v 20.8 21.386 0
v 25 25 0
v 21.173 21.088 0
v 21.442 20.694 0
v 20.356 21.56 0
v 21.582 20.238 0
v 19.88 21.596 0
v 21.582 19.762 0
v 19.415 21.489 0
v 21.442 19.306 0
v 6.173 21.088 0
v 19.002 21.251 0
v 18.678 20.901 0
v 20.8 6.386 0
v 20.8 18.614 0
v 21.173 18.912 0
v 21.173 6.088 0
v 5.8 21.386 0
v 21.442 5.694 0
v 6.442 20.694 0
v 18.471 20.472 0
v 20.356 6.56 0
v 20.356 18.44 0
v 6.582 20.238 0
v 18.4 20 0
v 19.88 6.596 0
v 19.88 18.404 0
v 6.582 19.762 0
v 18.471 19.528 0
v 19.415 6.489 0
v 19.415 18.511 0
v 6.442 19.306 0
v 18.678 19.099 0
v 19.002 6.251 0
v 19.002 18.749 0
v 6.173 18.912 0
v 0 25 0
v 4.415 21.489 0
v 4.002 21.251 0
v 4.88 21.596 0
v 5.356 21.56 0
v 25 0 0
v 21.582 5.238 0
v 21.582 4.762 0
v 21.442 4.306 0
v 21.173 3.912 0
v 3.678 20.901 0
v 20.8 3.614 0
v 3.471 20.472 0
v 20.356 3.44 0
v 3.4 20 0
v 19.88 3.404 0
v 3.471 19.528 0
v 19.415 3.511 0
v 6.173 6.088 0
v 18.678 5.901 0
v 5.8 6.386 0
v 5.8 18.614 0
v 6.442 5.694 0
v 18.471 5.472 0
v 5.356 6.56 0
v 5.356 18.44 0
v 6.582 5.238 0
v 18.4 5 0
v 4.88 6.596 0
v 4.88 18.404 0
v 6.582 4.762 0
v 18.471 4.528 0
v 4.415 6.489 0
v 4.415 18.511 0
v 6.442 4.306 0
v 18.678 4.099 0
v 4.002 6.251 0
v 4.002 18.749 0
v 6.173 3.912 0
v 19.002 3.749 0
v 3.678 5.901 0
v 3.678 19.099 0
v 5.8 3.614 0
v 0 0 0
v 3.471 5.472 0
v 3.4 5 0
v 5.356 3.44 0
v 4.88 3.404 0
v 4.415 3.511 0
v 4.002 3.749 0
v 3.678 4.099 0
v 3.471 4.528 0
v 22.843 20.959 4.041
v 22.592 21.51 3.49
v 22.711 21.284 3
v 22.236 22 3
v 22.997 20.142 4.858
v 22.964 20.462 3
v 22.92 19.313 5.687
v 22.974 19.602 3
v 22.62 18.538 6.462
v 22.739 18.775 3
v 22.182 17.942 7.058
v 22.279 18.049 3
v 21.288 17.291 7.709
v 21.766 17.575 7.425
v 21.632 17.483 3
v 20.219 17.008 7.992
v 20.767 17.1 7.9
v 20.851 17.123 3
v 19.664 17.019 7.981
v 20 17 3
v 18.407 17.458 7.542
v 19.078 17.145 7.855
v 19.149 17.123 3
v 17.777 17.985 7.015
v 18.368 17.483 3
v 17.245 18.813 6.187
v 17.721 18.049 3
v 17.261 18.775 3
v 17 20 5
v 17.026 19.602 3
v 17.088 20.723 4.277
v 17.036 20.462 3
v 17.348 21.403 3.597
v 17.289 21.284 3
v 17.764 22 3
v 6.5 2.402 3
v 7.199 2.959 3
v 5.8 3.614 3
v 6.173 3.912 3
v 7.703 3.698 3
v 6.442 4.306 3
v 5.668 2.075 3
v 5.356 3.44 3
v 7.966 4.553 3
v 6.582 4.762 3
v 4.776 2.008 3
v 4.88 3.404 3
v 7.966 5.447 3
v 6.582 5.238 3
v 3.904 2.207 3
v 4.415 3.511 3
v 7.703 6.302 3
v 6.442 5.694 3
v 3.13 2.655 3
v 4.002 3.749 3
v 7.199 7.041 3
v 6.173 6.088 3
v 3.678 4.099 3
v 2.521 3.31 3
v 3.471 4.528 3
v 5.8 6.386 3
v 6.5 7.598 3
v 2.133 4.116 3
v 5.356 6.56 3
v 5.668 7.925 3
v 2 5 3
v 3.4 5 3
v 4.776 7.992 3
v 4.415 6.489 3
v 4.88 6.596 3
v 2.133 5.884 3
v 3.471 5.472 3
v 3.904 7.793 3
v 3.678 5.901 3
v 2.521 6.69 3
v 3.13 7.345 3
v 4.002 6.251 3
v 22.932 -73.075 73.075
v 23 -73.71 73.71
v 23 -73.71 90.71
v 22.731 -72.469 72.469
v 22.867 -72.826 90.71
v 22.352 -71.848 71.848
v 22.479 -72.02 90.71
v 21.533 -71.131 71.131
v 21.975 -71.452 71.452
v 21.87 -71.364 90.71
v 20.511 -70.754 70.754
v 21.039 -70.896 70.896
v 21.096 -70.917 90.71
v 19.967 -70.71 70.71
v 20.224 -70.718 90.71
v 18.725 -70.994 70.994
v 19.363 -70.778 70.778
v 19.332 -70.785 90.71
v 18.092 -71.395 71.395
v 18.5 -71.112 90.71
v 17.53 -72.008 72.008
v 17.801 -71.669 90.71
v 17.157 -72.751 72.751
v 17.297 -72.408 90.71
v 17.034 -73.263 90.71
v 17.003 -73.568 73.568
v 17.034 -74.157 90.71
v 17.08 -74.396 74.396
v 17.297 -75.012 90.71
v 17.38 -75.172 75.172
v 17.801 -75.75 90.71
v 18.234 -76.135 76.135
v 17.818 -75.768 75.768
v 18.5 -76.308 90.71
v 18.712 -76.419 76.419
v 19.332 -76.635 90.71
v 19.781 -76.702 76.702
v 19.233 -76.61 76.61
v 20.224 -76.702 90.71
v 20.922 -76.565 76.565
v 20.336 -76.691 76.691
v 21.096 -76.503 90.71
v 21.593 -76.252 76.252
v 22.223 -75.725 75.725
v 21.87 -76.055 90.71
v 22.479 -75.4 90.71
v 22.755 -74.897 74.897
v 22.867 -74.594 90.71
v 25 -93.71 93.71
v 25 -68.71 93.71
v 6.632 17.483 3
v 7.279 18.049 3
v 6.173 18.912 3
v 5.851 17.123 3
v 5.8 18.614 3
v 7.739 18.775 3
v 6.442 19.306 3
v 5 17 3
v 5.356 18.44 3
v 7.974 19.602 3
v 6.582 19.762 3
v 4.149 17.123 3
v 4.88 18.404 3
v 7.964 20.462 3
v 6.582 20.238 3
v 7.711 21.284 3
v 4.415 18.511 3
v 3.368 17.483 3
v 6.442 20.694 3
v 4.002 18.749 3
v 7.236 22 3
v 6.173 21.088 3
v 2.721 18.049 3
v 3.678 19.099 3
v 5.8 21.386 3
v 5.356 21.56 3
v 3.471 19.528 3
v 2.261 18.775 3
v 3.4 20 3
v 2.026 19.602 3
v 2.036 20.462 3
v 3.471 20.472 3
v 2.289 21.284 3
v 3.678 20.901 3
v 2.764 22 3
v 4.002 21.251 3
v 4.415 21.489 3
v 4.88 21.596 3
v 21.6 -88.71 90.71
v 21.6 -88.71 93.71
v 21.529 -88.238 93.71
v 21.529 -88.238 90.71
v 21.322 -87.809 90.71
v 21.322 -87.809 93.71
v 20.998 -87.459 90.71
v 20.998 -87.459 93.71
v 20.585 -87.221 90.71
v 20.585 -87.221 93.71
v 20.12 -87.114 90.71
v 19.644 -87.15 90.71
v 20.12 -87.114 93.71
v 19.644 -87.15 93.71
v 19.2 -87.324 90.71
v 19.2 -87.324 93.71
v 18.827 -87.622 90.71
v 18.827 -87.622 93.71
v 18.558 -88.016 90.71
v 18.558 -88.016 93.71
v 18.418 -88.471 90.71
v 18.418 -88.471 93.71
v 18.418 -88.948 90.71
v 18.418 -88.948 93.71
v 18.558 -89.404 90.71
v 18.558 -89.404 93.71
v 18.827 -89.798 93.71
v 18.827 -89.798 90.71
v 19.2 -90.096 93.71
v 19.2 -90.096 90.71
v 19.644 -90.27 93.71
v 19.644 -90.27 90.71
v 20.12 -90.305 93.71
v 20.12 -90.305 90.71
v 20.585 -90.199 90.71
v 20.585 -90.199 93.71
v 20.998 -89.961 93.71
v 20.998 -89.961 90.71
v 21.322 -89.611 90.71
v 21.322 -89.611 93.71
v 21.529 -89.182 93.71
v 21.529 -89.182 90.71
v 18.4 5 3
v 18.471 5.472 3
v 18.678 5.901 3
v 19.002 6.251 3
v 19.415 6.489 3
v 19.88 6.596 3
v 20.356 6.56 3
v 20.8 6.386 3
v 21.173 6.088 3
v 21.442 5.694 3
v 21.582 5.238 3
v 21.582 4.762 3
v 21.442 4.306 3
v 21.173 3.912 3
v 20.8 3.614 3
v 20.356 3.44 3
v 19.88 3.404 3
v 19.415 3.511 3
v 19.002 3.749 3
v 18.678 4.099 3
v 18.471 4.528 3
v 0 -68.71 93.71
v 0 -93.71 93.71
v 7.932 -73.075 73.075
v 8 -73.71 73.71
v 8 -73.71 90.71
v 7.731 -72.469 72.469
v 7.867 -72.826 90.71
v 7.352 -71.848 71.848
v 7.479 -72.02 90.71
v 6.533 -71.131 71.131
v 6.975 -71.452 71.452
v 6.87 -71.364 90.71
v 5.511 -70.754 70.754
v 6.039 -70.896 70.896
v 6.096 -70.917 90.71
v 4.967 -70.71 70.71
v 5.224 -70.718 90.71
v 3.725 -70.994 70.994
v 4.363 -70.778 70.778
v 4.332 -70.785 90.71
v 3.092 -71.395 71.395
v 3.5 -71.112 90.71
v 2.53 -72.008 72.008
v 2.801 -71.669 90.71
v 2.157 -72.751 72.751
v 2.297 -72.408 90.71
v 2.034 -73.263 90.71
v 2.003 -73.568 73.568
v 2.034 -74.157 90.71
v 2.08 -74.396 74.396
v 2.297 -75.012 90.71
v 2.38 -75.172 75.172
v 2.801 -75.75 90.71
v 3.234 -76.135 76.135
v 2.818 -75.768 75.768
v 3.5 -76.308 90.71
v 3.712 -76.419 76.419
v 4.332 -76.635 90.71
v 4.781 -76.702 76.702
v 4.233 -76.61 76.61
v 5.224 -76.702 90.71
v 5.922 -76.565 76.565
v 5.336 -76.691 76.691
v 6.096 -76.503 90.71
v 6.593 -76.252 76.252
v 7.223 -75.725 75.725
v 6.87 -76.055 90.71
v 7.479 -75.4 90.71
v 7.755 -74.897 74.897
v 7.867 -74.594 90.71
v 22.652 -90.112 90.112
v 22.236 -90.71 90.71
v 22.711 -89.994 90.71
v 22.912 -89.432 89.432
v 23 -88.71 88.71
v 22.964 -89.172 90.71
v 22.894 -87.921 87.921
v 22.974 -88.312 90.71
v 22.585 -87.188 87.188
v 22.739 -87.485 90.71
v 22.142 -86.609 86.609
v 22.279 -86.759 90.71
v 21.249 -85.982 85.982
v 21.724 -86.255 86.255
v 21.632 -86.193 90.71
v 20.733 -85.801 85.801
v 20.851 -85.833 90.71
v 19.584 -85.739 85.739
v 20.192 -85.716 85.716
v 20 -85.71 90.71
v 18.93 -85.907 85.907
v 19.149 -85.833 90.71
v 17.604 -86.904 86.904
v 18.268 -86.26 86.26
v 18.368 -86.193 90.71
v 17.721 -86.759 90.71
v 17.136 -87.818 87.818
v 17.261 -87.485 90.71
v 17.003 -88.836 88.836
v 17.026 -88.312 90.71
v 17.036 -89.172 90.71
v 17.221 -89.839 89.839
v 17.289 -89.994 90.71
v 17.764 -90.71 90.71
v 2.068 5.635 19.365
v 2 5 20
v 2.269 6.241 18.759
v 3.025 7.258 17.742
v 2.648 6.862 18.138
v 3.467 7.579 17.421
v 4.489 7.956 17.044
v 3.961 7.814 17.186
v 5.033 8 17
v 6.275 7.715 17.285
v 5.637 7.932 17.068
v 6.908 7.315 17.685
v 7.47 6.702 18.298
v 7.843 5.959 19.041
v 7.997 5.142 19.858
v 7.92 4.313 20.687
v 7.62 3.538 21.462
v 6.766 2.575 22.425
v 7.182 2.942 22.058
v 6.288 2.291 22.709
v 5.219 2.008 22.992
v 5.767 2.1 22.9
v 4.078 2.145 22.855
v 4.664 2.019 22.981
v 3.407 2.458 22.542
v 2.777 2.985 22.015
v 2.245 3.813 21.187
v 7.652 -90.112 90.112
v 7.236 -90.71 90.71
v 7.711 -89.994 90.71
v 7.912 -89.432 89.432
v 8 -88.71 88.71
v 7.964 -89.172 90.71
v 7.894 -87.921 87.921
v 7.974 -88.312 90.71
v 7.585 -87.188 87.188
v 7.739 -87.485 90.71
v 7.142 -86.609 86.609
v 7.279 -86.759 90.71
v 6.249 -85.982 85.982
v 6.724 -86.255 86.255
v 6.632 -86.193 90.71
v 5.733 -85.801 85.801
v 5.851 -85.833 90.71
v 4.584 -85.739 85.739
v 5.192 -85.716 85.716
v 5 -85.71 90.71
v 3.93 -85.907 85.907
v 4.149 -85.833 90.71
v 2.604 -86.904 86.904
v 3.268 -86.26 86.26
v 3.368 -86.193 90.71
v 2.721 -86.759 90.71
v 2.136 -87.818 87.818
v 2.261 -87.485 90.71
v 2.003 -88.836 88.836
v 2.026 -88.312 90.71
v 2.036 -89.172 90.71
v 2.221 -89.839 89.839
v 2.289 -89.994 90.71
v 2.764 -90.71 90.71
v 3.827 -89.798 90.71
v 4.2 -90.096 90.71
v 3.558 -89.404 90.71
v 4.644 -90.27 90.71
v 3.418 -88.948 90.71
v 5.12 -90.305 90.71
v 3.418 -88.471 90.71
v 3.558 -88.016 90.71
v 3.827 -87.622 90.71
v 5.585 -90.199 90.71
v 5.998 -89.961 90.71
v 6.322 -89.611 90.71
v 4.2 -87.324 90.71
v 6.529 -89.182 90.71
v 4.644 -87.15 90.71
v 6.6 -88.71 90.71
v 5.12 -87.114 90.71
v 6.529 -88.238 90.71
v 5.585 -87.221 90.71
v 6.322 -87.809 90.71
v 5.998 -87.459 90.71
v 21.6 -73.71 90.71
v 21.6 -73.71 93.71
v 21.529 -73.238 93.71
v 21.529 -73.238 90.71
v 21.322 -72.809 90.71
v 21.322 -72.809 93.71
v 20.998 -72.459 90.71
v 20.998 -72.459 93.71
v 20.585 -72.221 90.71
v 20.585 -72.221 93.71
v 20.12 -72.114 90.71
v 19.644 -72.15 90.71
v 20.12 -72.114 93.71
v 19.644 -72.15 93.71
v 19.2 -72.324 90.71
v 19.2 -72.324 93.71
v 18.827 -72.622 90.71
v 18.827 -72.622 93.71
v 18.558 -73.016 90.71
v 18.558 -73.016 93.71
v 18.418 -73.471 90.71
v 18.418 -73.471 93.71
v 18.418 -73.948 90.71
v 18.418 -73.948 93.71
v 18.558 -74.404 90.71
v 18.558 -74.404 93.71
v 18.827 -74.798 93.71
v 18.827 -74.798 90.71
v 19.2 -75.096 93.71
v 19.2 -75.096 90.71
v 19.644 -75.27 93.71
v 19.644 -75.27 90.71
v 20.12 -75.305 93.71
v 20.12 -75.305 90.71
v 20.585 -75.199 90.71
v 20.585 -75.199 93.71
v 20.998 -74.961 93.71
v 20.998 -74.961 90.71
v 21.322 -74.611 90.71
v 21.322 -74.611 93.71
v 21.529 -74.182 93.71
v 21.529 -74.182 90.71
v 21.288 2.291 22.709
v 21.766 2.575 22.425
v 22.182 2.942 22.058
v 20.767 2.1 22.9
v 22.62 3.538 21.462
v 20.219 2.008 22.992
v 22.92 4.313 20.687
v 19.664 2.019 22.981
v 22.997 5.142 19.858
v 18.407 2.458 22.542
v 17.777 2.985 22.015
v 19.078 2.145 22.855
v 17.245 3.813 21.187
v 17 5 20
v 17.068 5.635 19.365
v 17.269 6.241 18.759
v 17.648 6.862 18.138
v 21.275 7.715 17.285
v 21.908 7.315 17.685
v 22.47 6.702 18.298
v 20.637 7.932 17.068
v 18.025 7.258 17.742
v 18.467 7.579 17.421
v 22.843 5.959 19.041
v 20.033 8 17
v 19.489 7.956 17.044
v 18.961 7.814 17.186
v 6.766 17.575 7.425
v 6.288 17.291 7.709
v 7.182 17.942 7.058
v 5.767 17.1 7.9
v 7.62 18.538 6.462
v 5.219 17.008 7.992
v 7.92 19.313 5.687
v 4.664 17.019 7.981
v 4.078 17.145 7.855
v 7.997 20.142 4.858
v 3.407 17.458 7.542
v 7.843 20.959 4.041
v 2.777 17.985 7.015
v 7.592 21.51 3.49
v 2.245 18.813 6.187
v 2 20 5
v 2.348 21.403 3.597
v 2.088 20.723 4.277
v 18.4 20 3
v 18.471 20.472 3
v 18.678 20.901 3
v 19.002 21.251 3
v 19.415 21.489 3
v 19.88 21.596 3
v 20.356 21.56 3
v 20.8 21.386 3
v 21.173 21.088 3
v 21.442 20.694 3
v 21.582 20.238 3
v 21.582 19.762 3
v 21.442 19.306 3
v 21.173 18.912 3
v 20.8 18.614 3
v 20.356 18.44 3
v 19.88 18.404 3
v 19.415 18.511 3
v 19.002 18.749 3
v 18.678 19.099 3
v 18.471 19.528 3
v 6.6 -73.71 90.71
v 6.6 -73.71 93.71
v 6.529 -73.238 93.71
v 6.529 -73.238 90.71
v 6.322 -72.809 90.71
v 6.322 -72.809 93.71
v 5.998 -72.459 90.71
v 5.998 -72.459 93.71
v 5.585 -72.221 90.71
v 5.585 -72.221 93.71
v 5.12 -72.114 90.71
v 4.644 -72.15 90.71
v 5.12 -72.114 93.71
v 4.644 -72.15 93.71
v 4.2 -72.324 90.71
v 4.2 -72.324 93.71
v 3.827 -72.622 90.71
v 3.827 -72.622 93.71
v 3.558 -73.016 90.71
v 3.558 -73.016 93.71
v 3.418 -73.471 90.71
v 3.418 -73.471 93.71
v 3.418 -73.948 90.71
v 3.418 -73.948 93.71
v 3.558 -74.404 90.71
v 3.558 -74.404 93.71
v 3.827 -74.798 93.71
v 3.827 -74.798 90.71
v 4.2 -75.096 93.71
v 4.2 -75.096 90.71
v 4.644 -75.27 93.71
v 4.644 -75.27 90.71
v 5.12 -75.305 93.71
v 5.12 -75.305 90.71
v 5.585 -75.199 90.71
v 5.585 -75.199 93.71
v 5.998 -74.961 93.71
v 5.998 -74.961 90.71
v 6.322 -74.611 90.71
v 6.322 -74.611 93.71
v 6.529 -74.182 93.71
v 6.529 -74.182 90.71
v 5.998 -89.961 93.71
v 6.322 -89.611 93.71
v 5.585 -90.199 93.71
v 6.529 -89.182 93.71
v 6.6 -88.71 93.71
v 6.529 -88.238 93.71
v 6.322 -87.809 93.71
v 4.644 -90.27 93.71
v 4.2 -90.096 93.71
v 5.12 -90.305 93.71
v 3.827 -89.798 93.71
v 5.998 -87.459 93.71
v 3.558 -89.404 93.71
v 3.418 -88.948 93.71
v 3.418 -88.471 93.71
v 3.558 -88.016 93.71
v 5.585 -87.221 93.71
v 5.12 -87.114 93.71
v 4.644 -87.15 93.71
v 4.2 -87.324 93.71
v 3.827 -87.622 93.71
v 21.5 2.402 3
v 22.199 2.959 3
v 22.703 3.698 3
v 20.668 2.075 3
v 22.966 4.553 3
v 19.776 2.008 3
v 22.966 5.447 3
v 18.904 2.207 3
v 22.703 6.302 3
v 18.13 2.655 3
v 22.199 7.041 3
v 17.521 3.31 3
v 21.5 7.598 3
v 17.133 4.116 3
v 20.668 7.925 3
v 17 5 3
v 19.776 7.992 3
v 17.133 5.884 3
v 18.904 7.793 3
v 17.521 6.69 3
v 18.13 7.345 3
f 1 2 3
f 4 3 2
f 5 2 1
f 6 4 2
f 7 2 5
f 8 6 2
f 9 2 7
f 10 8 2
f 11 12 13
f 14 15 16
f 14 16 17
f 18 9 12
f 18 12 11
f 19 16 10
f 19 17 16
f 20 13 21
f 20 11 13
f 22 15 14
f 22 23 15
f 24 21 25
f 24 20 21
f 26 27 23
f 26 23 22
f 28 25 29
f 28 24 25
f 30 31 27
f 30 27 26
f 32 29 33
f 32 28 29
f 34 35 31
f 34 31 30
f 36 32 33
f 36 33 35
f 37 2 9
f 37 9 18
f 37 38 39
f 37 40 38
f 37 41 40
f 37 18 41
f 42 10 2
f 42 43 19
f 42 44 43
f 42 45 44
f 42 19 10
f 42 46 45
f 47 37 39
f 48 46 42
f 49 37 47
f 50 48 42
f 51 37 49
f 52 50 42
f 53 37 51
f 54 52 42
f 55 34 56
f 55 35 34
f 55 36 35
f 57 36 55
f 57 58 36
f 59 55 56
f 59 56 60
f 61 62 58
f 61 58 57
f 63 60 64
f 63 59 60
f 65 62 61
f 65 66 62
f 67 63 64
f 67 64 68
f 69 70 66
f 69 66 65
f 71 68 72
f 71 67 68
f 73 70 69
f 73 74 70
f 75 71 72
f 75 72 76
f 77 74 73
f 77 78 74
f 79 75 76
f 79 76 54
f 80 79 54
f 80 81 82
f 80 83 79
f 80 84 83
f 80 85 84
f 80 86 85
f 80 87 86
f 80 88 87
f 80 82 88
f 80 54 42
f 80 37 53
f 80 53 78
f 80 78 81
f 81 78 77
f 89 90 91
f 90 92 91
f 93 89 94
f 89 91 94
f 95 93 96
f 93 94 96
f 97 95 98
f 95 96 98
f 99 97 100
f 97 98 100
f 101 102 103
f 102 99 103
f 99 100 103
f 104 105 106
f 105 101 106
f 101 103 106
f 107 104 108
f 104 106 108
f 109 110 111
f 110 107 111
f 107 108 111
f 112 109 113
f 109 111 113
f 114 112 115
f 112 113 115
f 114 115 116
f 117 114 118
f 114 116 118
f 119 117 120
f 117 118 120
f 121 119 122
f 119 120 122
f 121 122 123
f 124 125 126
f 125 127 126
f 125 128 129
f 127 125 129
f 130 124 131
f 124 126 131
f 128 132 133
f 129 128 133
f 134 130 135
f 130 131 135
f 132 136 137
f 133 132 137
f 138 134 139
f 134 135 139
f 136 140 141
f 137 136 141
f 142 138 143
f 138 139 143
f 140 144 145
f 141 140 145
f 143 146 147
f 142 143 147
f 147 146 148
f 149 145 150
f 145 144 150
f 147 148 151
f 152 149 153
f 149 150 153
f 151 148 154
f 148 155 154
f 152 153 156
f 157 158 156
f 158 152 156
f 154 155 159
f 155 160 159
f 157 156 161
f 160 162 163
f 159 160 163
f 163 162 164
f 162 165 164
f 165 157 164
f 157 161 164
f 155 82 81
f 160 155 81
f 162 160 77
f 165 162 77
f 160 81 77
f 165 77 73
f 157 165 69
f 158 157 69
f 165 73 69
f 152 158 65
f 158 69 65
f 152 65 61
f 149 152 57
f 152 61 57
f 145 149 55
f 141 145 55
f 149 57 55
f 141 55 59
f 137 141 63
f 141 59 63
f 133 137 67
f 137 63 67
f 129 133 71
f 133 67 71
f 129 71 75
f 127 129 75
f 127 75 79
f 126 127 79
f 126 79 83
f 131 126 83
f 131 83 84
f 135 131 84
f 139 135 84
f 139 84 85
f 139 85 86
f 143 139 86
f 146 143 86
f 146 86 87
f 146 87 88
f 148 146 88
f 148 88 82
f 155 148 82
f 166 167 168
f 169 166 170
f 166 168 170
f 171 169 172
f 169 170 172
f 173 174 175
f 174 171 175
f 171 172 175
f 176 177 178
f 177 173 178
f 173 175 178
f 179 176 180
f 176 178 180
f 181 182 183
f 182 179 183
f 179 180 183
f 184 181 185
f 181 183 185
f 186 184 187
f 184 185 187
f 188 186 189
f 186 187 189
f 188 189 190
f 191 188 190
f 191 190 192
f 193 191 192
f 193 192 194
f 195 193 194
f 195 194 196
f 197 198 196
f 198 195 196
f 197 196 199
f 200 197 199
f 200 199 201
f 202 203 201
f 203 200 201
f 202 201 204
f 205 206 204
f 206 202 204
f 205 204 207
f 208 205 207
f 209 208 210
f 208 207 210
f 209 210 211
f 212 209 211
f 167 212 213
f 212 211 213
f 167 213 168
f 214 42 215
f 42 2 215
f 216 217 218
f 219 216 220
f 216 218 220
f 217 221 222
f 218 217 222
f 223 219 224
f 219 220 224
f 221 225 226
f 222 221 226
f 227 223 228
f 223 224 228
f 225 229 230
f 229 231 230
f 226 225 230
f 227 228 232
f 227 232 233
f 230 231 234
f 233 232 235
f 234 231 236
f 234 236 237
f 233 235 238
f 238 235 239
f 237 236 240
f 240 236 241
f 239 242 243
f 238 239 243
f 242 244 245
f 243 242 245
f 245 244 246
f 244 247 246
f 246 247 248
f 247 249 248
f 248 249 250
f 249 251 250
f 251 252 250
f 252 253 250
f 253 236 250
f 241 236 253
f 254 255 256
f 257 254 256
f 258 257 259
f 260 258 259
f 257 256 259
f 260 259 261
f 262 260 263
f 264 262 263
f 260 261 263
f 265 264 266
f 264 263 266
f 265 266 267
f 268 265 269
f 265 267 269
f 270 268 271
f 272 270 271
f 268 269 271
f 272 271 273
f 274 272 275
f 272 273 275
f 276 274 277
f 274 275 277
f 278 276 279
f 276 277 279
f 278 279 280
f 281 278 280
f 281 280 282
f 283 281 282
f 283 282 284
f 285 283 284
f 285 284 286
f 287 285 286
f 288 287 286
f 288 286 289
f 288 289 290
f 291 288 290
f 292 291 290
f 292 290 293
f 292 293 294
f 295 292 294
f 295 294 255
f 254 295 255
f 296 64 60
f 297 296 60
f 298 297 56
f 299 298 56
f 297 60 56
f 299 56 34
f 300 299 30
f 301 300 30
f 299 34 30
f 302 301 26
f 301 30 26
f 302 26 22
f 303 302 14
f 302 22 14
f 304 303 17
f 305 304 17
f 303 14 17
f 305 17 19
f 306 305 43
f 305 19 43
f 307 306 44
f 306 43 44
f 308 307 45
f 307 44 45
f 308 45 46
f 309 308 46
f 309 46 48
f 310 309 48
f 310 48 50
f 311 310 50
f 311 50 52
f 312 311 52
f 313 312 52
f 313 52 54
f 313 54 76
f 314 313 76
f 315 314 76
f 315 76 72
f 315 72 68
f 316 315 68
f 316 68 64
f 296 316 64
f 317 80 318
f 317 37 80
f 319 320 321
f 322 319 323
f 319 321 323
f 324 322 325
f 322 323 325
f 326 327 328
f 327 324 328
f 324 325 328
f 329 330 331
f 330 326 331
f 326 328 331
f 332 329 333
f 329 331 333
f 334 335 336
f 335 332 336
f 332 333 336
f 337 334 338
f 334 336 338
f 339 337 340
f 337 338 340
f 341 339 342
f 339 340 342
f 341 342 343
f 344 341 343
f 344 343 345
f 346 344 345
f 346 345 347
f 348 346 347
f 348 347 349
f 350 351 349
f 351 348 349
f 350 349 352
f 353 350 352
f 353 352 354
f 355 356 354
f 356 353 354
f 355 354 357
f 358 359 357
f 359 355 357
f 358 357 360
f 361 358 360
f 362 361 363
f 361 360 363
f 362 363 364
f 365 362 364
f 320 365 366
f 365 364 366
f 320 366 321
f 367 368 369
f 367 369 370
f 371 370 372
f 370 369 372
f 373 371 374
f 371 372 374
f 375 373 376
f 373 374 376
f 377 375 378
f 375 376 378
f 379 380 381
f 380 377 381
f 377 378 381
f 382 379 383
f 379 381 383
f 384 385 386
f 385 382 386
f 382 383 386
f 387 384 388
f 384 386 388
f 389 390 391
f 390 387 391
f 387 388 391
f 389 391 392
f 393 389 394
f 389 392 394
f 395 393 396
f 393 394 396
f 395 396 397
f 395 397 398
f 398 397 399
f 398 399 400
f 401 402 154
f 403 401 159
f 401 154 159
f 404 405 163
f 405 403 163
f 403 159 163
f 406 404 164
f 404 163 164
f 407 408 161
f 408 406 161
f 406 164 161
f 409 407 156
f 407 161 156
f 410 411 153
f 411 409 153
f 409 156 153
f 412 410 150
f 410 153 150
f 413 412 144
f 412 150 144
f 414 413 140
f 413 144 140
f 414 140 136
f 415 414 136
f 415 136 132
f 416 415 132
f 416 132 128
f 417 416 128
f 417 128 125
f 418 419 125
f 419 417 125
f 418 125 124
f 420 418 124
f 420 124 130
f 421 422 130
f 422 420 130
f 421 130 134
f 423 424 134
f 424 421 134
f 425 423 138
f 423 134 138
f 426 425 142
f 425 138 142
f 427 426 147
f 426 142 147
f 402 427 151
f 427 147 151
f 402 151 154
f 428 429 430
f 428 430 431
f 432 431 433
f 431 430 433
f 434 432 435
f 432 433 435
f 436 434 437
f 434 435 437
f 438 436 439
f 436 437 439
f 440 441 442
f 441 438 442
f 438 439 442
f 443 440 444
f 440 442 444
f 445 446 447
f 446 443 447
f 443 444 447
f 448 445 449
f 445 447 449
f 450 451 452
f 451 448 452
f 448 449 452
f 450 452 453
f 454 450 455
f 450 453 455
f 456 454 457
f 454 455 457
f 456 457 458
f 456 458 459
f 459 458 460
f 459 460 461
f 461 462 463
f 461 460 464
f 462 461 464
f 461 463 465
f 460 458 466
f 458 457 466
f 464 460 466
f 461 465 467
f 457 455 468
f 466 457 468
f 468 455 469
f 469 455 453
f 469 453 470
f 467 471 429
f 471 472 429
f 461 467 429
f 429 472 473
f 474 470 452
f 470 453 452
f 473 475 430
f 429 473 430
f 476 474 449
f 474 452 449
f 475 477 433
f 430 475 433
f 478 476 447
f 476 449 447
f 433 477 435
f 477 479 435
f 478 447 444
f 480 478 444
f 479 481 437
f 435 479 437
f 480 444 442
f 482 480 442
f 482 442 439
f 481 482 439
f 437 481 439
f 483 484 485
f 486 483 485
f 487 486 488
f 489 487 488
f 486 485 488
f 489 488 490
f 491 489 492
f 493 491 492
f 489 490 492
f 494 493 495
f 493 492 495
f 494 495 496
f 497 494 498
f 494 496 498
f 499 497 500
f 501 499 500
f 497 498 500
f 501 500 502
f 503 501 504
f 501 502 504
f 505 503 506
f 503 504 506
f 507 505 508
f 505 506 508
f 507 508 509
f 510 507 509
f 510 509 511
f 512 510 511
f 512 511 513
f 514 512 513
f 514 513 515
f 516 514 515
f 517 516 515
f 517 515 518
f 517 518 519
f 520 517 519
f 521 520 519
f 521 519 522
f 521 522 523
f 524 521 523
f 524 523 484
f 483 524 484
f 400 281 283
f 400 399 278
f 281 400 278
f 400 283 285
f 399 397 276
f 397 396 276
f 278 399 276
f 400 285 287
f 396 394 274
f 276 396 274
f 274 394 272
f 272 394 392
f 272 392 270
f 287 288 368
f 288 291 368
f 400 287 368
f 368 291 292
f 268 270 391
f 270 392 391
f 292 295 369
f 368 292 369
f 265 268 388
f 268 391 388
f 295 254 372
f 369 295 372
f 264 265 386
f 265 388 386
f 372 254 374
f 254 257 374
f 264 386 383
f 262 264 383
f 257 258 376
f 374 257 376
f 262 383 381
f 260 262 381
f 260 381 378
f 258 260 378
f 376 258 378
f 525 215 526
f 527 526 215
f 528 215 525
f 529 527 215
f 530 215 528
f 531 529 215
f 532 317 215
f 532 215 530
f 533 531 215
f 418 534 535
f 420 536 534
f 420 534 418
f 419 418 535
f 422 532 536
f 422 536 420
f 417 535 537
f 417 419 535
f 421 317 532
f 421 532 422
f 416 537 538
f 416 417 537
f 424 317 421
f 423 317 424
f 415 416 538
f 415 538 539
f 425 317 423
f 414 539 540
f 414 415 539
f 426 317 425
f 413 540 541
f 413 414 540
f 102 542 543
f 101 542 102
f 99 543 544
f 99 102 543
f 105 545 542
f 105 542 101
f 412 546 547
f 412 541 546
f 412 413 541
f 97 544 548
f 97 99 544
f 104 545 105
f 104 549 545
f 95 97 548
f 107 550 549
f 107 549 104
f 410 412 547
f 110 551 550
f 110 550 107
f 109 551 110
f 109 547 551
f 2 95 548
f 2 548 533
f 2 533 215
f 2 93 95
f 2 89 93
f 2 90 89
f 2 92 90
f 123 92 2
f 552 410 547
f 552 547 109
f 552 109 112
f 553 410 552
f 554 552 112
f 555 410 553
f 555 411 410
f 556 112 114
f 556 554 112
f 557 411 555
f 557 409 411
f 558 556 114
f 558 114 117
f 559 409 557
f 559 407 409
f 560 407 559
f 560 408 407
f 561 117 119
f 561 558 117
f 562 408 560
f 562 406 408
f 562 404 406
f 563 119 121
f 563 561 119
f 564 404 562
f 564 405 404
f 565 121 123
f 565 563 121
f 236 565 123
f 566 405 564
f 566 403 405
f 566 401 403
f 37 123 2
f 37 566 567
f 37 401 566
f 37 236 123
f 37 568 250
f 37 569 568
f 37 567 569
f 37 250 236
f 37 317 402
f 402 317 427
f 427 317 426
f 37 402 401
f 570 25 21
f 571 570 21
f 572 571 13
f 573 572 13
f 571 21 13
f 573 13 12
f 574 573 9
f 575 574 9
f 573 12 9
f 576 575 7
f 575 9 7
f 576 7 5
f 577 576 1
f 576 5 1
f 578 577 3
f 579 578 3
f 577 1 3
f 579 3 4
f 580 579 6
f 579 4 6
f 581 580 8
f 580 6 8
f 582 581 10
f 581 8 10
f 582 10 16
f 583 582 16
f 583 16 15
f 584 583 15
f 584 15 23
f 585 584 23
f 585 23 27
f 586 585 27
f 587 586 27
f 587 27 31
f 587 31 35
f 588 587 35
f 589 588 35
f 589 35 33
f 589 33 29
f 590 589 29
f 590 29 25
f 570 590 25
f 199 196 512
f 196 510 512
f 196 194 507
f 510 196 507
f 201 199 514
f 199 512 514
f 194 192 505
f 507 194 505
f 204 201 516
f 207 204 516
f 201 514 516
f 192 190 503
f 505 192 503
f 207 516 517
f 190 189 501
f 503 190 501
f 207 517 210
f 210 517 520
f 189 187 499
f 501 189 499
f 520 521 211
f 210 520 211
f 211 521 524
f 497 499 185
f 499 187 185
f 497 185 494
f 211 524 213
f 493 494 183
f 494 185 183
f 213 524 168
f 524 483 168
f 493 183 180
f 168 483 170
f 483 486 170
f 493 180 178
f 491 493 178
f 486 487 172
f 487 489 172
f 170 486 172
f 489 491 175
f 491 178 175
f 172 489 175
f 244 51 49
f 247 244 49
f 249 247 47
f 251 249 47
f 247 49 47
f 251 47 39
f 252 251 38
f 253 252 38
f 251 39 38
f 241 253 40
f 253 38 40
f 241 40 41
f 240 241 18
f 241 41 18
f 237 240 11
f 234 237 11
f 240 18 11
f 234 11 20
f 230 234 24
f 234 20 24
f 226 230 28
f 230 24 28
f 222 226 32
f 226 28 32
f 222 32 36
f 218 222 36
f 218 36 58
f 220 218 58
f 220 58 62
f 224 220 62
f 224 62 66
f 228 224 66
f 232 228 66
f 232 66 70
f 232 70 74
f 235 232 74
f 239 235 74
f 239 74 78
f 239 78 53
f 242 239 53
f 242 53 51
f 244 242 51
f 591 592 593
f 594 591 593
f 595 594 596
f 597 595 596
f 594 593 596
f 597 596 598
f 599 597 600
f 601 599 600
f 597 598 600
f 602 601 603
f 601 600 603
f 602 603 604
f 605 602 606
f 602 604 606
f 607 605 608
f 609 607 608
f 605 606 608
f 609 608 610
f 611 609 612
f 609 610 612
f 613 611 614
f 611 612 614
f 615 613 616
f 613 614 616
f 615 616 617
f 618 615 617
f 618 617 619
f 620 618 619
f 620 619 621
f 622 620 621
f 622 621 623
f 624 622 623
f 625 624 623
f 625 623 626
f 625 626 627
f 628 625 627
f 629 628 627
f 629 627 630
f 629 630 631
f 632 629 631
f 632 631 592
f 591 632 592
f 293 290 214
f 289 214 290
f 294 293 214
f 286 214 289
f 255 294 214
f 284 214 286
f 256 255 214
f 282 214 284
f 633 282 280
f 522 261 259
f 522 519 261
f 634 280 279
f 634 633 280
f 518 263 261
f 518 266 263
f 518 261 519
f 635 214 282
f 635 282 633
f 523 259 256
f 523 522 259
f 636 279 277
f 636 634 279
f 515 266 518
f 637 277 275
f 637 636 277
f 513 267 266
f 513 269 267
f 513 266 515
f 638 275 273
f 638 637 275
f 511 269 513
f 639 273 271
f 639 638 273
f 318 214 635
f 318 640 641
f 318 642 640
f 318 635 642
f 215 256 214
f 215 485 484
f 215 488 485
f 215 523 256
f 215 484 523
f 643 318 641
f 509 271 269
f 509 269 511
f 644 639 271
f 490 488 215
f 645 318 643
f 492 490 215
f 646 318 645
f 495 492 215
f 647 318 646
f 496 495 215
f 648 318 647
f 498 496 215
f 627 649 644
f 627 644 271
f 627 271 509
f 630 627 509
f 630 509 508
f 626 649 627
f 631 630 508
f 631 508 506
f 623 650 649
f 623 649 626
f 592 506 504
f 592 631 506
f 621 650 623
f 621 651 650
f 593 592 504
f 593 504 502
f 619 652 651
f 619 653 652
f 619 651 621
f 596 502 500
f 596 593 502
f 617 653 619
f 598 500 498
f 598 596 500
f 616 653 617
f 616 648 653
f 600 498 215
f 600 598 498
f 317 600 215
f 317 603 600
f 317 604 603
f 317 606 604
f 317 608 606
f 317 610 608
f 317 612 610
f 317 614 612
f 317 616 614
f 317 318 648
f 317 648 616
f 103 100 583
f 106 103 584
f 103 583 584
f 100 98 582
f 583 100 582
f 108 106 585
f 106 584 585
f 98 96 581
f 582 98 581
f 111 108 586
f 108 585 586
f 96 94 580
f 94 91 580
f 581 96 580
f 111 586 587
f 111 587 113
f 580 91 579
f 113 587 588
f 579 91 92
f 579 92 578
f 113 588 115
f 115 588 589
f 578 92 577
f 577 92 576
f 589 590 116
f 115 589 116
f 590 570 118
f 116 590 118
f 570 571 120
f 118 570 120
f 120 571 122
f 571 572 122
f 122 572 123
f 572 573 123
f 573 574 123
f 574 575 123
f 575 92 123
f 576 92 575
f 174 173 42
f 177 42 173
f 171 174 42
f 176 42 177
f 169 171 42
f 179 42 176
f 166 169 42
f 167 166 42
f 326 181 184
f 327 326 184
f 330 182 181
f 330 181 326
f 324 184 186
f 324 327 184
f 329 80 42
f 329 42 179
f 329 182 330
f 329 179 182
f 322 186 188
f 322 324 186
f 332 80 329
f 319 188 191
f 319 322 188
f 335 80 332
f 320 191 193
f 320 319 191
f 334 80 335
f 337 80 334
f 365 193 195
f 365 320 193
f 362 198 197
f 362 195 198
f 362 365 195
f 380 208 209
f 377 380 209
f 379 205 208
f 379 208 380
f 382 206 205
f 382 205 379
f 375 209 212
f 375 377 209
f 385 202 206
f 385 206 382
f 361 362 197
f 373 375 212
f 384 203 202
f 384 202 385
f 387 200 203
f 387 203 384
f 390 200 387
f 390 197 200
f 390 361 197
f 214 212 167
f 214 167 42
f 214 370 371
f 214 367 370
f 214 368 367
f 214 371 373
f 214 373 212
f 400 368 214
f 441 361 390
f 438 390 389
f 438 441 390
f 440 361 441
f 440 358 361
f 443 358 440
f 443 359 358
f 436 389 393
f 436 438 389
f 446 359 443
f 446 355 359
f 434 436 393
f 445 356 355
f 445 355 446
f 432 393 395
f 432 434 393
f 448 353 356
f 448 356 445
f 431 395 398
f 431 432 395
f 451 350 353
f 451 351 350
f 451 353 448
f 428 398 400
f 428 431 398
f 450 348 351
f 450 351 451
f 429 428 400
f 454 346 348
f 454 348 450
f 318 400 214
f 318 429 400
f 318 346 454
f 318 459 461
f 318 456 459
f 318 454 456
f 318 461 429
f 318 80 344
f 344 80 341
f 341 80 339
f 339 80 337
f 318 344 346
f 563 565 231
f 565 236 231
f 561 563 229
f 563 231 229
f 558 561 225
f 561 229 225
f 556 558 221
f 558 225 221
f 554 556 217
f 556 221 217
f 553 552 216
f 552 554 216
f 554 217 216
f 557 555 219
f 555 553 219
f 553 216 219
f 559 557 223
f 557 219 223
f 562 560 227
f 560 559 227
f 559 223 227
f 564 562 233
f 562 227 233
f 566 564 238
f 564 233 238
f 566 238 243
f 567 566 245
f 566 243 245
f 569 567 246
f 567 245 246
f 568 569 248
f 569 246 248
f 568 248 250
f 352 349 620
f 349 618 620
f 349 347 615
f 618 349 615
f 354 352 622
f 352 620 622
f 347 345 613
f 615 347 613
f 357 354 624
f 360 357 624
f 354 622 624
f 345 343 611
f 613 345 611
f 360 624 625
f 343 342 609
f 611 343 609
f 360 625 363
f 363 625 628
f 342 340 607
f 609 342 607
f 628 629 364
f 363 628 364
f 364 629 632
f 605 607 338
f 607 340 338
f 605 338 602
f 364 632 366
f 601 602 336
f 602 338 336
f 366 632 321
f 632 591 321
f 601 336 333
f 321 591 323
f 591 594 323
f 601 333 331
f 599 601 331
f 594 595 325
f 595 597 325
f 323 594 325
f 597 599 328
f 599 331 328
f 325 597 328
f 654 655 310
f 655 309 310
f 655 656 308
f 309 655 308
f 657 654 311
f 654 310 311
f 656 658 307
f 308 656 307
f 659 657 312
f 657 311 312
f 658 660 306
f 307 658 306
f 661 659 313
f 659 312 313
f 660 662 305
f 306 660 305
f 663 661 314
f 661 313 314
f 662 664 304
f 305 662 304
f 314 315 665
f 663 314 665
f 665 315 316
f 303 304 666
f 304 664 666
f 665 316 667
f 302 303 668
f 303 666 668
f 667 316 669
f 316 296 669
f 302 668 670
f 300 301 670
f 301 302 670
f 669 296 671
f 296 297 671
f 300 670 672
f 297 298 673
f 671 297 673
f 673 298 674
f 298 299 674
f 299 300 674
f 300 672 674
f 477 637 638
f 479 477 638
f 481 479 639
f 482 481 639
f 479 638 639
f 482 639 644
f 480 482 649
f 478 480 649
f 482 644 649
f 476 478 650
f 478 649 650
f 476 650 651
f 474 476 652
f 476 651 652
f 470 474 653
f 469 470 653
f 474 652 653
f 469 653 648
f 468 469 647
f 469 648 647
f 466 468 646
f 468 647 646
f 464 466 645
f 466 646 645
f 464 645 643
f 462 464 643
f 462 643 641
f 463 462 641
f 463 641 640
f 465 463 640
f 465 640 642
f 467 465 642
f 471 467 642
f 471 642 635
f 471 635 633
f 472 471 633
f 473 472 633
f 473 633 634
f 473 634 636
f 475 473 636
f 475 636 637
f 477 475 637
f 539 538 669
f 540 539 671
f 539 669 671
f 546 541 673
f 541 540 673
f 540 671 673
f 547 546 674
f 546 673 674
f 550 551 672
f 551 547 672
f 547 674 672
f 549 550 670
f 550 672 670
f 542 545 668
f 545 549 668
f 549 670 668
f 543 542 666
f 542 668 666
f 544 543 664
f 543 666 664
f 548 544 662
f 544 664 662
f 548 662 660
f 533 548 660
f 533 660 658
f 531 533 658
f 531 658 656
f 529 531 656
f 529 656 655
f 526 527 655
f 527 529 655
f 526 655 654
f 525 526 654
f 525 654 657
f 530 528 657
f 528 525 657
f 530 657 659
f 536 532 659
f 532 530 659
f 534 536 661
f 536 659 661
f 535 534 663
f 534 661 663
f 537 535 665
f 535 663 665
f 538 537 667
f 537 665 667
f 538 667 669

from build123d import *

# Parameters (mm, degrees)
BOSS_EXTRUDE1_DEPTH = 25
CUT_EXTRUDE7_REACH  = 139.863
CUT_EXTRUDE7_START  = -3
SKETCH3_R           = 3
SKETCH3_R_2         = 1.6
CUT_EXTRUDE8_REACH  = 136.863
SKETCH3_3_R         = 1.6
CUT_EXTRUDE9_REACH  = 139.863
CUT_EXTRUDE9_START  = -3
SKETCH4_R           = 3
SKETCH4_R_2         = 1.6
CUT_EXTRUDE10_REACH = 136.863
SKETCH4_2_R         = 1.6


with BuildPart() as part:
    # Sketch1 → Boss-Extrude1 (new body)
    with BuildSketch(Plane(origin=(0, 0, 0), x_dir=(0, 0, -1), z_dir=(1, 0, 0))):
        Polygon((0, 0), (-93.70992099, -93.70992099), (-93.70992099, -68.70992099), (0, 25), align=None)
    extrude(amount=BOSS_EXTRUDE1_DEPTH)

    # Sketch3 → Cut-Extrude7 (cut, up to next)
    with BuildSketch(Plane(origin=(0, 0, 0), x_dir=(-1, 0, 0), z_dir=(0, 0, -1)).offset(CUT_EXTRUDE7_START), mode=Mode.PRIVATE) as cut_extrude7_sk1:
        with Locations((-20, 20)):
            Circle(SKETCH3_R)
        with Locations((-20, 20)):
            Circle(SKETCH3_R_2, mode=Mode.SUBTRACT)
    cut_extrude7_tool1 = extrude(cut_extrude7_sk1.sketch, amount=-CUT_EXTRUDE7_REACH, mode=Mode.PRIVATE) & part.part
    # Sketch3 → Cut-Extrude7 (cut, up to next)
    with BuildSketch(Plane(origin=(0, 0, 0), x_dir=(-1, 0, 0), z_dir=(0, 0, -1)).offset(CUT_EXTRUDE7_START), mode=Mode.PRIVATE) as cut_extrude7_sk2:
        with Locations((-20, 5)):
            Circle(SKETCH3_R)
        with Locations((-20, 5)):
            Circle(SKETCH3_R_2, mode=Mode.SUBTRACT)
    cut_extrude7_tool2 = extrude(cut_extrude7_sk2.sketch, amount=-CUT_EXTRUDE7_REACH, mode=Mode.PRIVATE) & part.part
    # Sketch3 → Cut-Extrude7 (cut, up to next)
    with BuildSketch(Plane(origin=(0, 0, 0), x_dir=(-1, 0, 0), z_dir=(0, 0, -1)).offset(CUT_EXTRUDE7_START), mode=Mode.PRIVATE) as cut_extrude7_sk3:
        with Locations((-5, 5)):
            Circle(SKETCH3_R)
        with Locations((-5, 5)):
            Circle(SKETCH3_R_2, mode=Mode.SUBTRACT)
    cut_extrude7_tool3 = extrude(cut_extrude7_sk3.sketch, amount=-CUT_EXTRUDE7_REACH, mode=Mode.PRIVATE) & part.part
    # Sketch3 → Cut-Extrude7 (cut, up to next)
    with BuildSketch(Plane(origin=(0, 0, 0), x_dir=(-1, 0, 0), z_dir=(0, 0, -1)).offset(CUT_EXTRUDE7_START), mode=Mode.PRIVATE) as cut_extrude7_sk4:
        with Locations((-5, 20)):
            Circle(SKETCH3_R)
        with Locations((-5, 20)):
            Circle(SKETCH3_R_2, mode=Mode.SUBTRACT)
    cut_extrude7_tool4 = extrude(cut_extrude7_sk4.sketch, amount=-CUT_EXTRUDE7_REACH, mode=Mode.PRIVATE) & part.part
    add(cut_extrude7_tool1.solids().sort_by_distance((22.915147, 20, 3))[0], mode=Mode.SUBTRACT)
    add(cut_extrude7_tool2.solids().sort_by_distance((22.915147, 5, 3))[0], mode=Mode.SUBTRACT)
    add(cut_extrude7_tool3.solids().sort_by_distance((7.915147, 5, 3))[0], mode=Mode.SUBTRACT)
    add(cut_extrude7_tool4.solids().sort_by_distance((7.915147, 20, 3))[0], mode=Mode.SUBTRACT)

    # Sketch3<3> → Cut-Extrude8 (cut, up to next)
    with BuildSketch(Plane(origin=(0, 0, 0), x_dir=(-1, 0, 0), z_dir=(0, 0, -1)), mode=Mode.PRIVATE) as cut_extrude8_sk1:
        with Locations((-20, 20)):
            Circle(SKETCH3_3_R)
    cut_extrude8_tool1 = extrude(cut_extrude8_sk1.sketch, amount=-CUT_EXTRUDE8_REACH, mode=Mode.PRIVATE) & part.part
    # Sketch3<3> → Cut-Extrude8 (cut, up to next)
    with BuildSketch(Plane(origin=(0, 0, 0), x_dir=(-1, 0, 0), z_dir=(0, 0, -1)), mode=Mode.PRIVATE) as cut_extrude8_sk2:
        with Locations((-20, 5)):
            Circle(SKETCH3_3_R)
    cut_extrude8_tool2 = extrude(cut_extrude8_sk2.sketch, amount=-CUT_EXTRUDE8_REACH, mode=Mode.PRIVATE) & part.part
    # Sketch3<3> → Cut-Extrude8 (cut, up to next)
    with BuildSketch(Plane(origin=(0, 0, 0), x_dir=(-1, 0, 0), z_dir=(0, 0, -1)), mode=Mode.PRIVATE) as cut_extrude8_sk3:
        with Locations((-5, 5)):
            Circle(SKETCH3_3_R)
    cut_extrude8_tool3 = extrude(cut_extrude8_sk3.sketch, amount=-CUT_EXTRUDE8_REACH, mode=Mode.PRIVATE) & part.part
    # Sketch3<3> → Cut-Extrude8 (cut, up to next)
    with BuildSketch(Plane(origin=(0, 0, 0), x_dir=(-1, 0, 0), z_dir=(0, 0, -1)), mode=Mode.PRIVATE) as cut_extrude8_sk4:
        with Locations((-5, 20)):
            Circle(SKETCH3_3_R)
    cut_extrude8_tool4 = extrude(cut_extrude8_sk4.sketch, amount=-CUT_EXTRUDE8_REACH, mode=Mode.PRIVATE) & part.part
    add(cut_extrude8_tool1.solids().sort_by_distance((20, 20, 0))[0], mode=Mode.SUBTRACT)
    add(cut_extrude8_tool2.solids().sort_by_distance((20, 5, 0))[0], mode=Mode.SUBTRACT)
    add(cut_extrude8_tool3.solids().sort_by_distance((5, 5, 0))[0], mode=Mode.SUBTRACT)
    add(cut_extrude8_tool4.solids().sort_by_distance((5, 20, 0))[0], mode=Mode.SUBTRACT)

    # Sketch4 → Cut-Extrude9 (cut, up to next)
    with BuildSketch(Plane.XY.offset(93.70992099).offset(CUT_EXTRUDE9_START), mode=Mode.PRIVATE) as cut_extrude9_sk1:
        with Locations((5, -73.70992099)):
            Circle(SKETCH4_R)
        with Locations((5, -73.70992099)):
            Circle(SKETCH4_R_2, mode=Mode.SUBTRACT)
    cut_extrude9_tool1 = extrude(cut_extrude9_sk1.sketch, amount=-CUT_EXTRUDE9_REACH, mode=Mode.PRIVATE) & part.part
    # Sketch4 → Cut-Extrude9 (cut, up to next)
    with BuildSketch(Plane.XY.offset(93.70992099).offset(CUT_EXTRUDE9_START), mode=Mode.PRIVATE) as cut_extrude9_sk2:
        with Locations((5, -88.70992099)):
            Circle(SKETCH4_R)
        with Locations((5, -88.70992099)):
            Circle(SKETCH4_R_2, mode=Mode.SUBTRACT)
    cut_extrude9_tool2 = extrude(cut_extrude9_sk2.sketch, amount=-CUT_EXTRUDE9_REACH, mode=Mode.PRIVATE) & part.part
    # Sketch4 → Cut-Extrude9 (cut, up to next)
    with BuildSketch(Plane.XY.offset(93.70992099).offset(CUT_EXTRUDE9_START), mode=Mode.PRIVATE) as cut_extrude9_sk3:
        with Locations((20, -88.70992099)):
            Circle(SKETCH4_R)
        with Locations((20, -88.70992099)):
            Circle(SKETCH4_R_2, mode=Mode.SUBTRACT)
    cut_extrude9_tool3 = extrude(cut_extrude9_sk3.sketch, amount=-CUT_EXTRUDE9_REACH, mode=Mode.PRIVATE) & part.part
    # Sketch4 → Cut-Extrude9 (cut, up to next)
    with BuildSketch(Plane.XY.offset(93.70992099).offset(CUT_EXTRUDE9_START), mode=Mode.PRIVATE) as cut_extrude9_sk4:
        with Locations((20, -73.70992099)):
            Circle(SKETCH4_R)
        with Locations((20, -73.70992099)):
            Circle(SKETCH4_R_2, mode=Mode.SUBTRACT)
    cut_extrude9_tool4 = extrude(cut_extrude9_sk4.sketch, amount=-CUT_EXTRUDE9_REACH, mode=Mode.PRIVATE) & part.part
    add(cut_extrude9_tool1.solids().sort_by_distance((2.084853, -73.709921, 90.709921))[0], mode=Mode.SUBTRACT)
    add(cut_extrude9_tool2.solids().sort_by_distance((2.084853, -88.709921, 90.709921))[0], mode=Mode.SUBTRACT)
    add(cut_extrude9_tool3.solids().sort_by_distance((17.084853, -88.709921, 90.709921))[0], mode=Mode.SUBTRACT)
    add(cut_extrude9_tool4.solids().sort_by_distance((17.084853, -73.709921, 90.709921))[0], mode=Mode.SUBTRACT)

    # Sketch4<2> → Cut-Extrude10 (cut, up to next)
    with BuildSketch(Plane.XY.offset(93.70992099), mode=Mode.PRIVATE) as cut_extrude10_sk1:
        with Locations((5, -73.70992099)):
            Circle(SKETCH4_2_R)
    cut_extrude10_tool1 = extrude(cut_extrude10_sk1.sketch, amount=-CUT_EXTRUDE10_REACH, mode=Mode.PRIVATE) & part.part
    # Sketch4<2> → Cut-Extrude10 (cut, up to next)
    with BuildSketch(Plane.XY.offset(93.70992099), mode=Mode.PRIVATE) as cut_extrude10_sk2:
        with Locations((5, -88.70992099)):
            Circle(SKETCH4_2_R)
    cut_extrude10_tool2 = extrude(cut_extrude10_sk2.sketch, amount=-CUT_EXTRUDE10_REACH, mode=Mode.PRIVATE) & part.part
    # Sketch4<2> → Cut-Extrude10 (cut, up to next)
    with BuildSketch(Plane.XY.offset(93.70992099), mode=Mode.PRIVATE) as cut_extrude10_sk3:
        with Locations((20, -88.70992099)):
            Circle(SKETCH4_2_R)
    cut_extrude10_tool3 = extrude(cut_extrude10_sk3.sketch, amount=-CUT_EXTRUDE10_REACH, mode=Mode.PRIVATE) & part.part
    # Sketch4<2> → Cut-Extrude10 (cut, up to next)
    with BuildSketch(Plane.XY.offset(93.70992099), mode=Mode.PRIVATE) as cut_extrude10_sk4:
        with Locations((20, -73.70992099)):
            Circle(SKETCH4_2_R)
    cut_extrude10_tool4 = extrude(cut_extrude10_sk4.sketch, amount=-CUT_EXTRUDE10_REACH, mode=Mode.PRIVATE) & part.part
    add(cut_extrude10_tool1.solids().sort_by_distance((5, -73.709921, 93.709921))[0], mode=Mode.SUBTRACT)
    add(cut_extrude10_tool2.solids().sort_by_distance((5, -88.709921, 93.709921))[0], mode=Mode.SUBTRACT)
    add(cut_extrude10_tool3.solids().sort_by_distance((20, -88.709921, 93.709921))[0], mode=Mode.SUBTRACT)
    add(cut_extrude10_tool4.solids().sort_by_distance((20, -73.709921, 93.709921))[0], mode=Mode.SUBTRACT)


solid = part.part
